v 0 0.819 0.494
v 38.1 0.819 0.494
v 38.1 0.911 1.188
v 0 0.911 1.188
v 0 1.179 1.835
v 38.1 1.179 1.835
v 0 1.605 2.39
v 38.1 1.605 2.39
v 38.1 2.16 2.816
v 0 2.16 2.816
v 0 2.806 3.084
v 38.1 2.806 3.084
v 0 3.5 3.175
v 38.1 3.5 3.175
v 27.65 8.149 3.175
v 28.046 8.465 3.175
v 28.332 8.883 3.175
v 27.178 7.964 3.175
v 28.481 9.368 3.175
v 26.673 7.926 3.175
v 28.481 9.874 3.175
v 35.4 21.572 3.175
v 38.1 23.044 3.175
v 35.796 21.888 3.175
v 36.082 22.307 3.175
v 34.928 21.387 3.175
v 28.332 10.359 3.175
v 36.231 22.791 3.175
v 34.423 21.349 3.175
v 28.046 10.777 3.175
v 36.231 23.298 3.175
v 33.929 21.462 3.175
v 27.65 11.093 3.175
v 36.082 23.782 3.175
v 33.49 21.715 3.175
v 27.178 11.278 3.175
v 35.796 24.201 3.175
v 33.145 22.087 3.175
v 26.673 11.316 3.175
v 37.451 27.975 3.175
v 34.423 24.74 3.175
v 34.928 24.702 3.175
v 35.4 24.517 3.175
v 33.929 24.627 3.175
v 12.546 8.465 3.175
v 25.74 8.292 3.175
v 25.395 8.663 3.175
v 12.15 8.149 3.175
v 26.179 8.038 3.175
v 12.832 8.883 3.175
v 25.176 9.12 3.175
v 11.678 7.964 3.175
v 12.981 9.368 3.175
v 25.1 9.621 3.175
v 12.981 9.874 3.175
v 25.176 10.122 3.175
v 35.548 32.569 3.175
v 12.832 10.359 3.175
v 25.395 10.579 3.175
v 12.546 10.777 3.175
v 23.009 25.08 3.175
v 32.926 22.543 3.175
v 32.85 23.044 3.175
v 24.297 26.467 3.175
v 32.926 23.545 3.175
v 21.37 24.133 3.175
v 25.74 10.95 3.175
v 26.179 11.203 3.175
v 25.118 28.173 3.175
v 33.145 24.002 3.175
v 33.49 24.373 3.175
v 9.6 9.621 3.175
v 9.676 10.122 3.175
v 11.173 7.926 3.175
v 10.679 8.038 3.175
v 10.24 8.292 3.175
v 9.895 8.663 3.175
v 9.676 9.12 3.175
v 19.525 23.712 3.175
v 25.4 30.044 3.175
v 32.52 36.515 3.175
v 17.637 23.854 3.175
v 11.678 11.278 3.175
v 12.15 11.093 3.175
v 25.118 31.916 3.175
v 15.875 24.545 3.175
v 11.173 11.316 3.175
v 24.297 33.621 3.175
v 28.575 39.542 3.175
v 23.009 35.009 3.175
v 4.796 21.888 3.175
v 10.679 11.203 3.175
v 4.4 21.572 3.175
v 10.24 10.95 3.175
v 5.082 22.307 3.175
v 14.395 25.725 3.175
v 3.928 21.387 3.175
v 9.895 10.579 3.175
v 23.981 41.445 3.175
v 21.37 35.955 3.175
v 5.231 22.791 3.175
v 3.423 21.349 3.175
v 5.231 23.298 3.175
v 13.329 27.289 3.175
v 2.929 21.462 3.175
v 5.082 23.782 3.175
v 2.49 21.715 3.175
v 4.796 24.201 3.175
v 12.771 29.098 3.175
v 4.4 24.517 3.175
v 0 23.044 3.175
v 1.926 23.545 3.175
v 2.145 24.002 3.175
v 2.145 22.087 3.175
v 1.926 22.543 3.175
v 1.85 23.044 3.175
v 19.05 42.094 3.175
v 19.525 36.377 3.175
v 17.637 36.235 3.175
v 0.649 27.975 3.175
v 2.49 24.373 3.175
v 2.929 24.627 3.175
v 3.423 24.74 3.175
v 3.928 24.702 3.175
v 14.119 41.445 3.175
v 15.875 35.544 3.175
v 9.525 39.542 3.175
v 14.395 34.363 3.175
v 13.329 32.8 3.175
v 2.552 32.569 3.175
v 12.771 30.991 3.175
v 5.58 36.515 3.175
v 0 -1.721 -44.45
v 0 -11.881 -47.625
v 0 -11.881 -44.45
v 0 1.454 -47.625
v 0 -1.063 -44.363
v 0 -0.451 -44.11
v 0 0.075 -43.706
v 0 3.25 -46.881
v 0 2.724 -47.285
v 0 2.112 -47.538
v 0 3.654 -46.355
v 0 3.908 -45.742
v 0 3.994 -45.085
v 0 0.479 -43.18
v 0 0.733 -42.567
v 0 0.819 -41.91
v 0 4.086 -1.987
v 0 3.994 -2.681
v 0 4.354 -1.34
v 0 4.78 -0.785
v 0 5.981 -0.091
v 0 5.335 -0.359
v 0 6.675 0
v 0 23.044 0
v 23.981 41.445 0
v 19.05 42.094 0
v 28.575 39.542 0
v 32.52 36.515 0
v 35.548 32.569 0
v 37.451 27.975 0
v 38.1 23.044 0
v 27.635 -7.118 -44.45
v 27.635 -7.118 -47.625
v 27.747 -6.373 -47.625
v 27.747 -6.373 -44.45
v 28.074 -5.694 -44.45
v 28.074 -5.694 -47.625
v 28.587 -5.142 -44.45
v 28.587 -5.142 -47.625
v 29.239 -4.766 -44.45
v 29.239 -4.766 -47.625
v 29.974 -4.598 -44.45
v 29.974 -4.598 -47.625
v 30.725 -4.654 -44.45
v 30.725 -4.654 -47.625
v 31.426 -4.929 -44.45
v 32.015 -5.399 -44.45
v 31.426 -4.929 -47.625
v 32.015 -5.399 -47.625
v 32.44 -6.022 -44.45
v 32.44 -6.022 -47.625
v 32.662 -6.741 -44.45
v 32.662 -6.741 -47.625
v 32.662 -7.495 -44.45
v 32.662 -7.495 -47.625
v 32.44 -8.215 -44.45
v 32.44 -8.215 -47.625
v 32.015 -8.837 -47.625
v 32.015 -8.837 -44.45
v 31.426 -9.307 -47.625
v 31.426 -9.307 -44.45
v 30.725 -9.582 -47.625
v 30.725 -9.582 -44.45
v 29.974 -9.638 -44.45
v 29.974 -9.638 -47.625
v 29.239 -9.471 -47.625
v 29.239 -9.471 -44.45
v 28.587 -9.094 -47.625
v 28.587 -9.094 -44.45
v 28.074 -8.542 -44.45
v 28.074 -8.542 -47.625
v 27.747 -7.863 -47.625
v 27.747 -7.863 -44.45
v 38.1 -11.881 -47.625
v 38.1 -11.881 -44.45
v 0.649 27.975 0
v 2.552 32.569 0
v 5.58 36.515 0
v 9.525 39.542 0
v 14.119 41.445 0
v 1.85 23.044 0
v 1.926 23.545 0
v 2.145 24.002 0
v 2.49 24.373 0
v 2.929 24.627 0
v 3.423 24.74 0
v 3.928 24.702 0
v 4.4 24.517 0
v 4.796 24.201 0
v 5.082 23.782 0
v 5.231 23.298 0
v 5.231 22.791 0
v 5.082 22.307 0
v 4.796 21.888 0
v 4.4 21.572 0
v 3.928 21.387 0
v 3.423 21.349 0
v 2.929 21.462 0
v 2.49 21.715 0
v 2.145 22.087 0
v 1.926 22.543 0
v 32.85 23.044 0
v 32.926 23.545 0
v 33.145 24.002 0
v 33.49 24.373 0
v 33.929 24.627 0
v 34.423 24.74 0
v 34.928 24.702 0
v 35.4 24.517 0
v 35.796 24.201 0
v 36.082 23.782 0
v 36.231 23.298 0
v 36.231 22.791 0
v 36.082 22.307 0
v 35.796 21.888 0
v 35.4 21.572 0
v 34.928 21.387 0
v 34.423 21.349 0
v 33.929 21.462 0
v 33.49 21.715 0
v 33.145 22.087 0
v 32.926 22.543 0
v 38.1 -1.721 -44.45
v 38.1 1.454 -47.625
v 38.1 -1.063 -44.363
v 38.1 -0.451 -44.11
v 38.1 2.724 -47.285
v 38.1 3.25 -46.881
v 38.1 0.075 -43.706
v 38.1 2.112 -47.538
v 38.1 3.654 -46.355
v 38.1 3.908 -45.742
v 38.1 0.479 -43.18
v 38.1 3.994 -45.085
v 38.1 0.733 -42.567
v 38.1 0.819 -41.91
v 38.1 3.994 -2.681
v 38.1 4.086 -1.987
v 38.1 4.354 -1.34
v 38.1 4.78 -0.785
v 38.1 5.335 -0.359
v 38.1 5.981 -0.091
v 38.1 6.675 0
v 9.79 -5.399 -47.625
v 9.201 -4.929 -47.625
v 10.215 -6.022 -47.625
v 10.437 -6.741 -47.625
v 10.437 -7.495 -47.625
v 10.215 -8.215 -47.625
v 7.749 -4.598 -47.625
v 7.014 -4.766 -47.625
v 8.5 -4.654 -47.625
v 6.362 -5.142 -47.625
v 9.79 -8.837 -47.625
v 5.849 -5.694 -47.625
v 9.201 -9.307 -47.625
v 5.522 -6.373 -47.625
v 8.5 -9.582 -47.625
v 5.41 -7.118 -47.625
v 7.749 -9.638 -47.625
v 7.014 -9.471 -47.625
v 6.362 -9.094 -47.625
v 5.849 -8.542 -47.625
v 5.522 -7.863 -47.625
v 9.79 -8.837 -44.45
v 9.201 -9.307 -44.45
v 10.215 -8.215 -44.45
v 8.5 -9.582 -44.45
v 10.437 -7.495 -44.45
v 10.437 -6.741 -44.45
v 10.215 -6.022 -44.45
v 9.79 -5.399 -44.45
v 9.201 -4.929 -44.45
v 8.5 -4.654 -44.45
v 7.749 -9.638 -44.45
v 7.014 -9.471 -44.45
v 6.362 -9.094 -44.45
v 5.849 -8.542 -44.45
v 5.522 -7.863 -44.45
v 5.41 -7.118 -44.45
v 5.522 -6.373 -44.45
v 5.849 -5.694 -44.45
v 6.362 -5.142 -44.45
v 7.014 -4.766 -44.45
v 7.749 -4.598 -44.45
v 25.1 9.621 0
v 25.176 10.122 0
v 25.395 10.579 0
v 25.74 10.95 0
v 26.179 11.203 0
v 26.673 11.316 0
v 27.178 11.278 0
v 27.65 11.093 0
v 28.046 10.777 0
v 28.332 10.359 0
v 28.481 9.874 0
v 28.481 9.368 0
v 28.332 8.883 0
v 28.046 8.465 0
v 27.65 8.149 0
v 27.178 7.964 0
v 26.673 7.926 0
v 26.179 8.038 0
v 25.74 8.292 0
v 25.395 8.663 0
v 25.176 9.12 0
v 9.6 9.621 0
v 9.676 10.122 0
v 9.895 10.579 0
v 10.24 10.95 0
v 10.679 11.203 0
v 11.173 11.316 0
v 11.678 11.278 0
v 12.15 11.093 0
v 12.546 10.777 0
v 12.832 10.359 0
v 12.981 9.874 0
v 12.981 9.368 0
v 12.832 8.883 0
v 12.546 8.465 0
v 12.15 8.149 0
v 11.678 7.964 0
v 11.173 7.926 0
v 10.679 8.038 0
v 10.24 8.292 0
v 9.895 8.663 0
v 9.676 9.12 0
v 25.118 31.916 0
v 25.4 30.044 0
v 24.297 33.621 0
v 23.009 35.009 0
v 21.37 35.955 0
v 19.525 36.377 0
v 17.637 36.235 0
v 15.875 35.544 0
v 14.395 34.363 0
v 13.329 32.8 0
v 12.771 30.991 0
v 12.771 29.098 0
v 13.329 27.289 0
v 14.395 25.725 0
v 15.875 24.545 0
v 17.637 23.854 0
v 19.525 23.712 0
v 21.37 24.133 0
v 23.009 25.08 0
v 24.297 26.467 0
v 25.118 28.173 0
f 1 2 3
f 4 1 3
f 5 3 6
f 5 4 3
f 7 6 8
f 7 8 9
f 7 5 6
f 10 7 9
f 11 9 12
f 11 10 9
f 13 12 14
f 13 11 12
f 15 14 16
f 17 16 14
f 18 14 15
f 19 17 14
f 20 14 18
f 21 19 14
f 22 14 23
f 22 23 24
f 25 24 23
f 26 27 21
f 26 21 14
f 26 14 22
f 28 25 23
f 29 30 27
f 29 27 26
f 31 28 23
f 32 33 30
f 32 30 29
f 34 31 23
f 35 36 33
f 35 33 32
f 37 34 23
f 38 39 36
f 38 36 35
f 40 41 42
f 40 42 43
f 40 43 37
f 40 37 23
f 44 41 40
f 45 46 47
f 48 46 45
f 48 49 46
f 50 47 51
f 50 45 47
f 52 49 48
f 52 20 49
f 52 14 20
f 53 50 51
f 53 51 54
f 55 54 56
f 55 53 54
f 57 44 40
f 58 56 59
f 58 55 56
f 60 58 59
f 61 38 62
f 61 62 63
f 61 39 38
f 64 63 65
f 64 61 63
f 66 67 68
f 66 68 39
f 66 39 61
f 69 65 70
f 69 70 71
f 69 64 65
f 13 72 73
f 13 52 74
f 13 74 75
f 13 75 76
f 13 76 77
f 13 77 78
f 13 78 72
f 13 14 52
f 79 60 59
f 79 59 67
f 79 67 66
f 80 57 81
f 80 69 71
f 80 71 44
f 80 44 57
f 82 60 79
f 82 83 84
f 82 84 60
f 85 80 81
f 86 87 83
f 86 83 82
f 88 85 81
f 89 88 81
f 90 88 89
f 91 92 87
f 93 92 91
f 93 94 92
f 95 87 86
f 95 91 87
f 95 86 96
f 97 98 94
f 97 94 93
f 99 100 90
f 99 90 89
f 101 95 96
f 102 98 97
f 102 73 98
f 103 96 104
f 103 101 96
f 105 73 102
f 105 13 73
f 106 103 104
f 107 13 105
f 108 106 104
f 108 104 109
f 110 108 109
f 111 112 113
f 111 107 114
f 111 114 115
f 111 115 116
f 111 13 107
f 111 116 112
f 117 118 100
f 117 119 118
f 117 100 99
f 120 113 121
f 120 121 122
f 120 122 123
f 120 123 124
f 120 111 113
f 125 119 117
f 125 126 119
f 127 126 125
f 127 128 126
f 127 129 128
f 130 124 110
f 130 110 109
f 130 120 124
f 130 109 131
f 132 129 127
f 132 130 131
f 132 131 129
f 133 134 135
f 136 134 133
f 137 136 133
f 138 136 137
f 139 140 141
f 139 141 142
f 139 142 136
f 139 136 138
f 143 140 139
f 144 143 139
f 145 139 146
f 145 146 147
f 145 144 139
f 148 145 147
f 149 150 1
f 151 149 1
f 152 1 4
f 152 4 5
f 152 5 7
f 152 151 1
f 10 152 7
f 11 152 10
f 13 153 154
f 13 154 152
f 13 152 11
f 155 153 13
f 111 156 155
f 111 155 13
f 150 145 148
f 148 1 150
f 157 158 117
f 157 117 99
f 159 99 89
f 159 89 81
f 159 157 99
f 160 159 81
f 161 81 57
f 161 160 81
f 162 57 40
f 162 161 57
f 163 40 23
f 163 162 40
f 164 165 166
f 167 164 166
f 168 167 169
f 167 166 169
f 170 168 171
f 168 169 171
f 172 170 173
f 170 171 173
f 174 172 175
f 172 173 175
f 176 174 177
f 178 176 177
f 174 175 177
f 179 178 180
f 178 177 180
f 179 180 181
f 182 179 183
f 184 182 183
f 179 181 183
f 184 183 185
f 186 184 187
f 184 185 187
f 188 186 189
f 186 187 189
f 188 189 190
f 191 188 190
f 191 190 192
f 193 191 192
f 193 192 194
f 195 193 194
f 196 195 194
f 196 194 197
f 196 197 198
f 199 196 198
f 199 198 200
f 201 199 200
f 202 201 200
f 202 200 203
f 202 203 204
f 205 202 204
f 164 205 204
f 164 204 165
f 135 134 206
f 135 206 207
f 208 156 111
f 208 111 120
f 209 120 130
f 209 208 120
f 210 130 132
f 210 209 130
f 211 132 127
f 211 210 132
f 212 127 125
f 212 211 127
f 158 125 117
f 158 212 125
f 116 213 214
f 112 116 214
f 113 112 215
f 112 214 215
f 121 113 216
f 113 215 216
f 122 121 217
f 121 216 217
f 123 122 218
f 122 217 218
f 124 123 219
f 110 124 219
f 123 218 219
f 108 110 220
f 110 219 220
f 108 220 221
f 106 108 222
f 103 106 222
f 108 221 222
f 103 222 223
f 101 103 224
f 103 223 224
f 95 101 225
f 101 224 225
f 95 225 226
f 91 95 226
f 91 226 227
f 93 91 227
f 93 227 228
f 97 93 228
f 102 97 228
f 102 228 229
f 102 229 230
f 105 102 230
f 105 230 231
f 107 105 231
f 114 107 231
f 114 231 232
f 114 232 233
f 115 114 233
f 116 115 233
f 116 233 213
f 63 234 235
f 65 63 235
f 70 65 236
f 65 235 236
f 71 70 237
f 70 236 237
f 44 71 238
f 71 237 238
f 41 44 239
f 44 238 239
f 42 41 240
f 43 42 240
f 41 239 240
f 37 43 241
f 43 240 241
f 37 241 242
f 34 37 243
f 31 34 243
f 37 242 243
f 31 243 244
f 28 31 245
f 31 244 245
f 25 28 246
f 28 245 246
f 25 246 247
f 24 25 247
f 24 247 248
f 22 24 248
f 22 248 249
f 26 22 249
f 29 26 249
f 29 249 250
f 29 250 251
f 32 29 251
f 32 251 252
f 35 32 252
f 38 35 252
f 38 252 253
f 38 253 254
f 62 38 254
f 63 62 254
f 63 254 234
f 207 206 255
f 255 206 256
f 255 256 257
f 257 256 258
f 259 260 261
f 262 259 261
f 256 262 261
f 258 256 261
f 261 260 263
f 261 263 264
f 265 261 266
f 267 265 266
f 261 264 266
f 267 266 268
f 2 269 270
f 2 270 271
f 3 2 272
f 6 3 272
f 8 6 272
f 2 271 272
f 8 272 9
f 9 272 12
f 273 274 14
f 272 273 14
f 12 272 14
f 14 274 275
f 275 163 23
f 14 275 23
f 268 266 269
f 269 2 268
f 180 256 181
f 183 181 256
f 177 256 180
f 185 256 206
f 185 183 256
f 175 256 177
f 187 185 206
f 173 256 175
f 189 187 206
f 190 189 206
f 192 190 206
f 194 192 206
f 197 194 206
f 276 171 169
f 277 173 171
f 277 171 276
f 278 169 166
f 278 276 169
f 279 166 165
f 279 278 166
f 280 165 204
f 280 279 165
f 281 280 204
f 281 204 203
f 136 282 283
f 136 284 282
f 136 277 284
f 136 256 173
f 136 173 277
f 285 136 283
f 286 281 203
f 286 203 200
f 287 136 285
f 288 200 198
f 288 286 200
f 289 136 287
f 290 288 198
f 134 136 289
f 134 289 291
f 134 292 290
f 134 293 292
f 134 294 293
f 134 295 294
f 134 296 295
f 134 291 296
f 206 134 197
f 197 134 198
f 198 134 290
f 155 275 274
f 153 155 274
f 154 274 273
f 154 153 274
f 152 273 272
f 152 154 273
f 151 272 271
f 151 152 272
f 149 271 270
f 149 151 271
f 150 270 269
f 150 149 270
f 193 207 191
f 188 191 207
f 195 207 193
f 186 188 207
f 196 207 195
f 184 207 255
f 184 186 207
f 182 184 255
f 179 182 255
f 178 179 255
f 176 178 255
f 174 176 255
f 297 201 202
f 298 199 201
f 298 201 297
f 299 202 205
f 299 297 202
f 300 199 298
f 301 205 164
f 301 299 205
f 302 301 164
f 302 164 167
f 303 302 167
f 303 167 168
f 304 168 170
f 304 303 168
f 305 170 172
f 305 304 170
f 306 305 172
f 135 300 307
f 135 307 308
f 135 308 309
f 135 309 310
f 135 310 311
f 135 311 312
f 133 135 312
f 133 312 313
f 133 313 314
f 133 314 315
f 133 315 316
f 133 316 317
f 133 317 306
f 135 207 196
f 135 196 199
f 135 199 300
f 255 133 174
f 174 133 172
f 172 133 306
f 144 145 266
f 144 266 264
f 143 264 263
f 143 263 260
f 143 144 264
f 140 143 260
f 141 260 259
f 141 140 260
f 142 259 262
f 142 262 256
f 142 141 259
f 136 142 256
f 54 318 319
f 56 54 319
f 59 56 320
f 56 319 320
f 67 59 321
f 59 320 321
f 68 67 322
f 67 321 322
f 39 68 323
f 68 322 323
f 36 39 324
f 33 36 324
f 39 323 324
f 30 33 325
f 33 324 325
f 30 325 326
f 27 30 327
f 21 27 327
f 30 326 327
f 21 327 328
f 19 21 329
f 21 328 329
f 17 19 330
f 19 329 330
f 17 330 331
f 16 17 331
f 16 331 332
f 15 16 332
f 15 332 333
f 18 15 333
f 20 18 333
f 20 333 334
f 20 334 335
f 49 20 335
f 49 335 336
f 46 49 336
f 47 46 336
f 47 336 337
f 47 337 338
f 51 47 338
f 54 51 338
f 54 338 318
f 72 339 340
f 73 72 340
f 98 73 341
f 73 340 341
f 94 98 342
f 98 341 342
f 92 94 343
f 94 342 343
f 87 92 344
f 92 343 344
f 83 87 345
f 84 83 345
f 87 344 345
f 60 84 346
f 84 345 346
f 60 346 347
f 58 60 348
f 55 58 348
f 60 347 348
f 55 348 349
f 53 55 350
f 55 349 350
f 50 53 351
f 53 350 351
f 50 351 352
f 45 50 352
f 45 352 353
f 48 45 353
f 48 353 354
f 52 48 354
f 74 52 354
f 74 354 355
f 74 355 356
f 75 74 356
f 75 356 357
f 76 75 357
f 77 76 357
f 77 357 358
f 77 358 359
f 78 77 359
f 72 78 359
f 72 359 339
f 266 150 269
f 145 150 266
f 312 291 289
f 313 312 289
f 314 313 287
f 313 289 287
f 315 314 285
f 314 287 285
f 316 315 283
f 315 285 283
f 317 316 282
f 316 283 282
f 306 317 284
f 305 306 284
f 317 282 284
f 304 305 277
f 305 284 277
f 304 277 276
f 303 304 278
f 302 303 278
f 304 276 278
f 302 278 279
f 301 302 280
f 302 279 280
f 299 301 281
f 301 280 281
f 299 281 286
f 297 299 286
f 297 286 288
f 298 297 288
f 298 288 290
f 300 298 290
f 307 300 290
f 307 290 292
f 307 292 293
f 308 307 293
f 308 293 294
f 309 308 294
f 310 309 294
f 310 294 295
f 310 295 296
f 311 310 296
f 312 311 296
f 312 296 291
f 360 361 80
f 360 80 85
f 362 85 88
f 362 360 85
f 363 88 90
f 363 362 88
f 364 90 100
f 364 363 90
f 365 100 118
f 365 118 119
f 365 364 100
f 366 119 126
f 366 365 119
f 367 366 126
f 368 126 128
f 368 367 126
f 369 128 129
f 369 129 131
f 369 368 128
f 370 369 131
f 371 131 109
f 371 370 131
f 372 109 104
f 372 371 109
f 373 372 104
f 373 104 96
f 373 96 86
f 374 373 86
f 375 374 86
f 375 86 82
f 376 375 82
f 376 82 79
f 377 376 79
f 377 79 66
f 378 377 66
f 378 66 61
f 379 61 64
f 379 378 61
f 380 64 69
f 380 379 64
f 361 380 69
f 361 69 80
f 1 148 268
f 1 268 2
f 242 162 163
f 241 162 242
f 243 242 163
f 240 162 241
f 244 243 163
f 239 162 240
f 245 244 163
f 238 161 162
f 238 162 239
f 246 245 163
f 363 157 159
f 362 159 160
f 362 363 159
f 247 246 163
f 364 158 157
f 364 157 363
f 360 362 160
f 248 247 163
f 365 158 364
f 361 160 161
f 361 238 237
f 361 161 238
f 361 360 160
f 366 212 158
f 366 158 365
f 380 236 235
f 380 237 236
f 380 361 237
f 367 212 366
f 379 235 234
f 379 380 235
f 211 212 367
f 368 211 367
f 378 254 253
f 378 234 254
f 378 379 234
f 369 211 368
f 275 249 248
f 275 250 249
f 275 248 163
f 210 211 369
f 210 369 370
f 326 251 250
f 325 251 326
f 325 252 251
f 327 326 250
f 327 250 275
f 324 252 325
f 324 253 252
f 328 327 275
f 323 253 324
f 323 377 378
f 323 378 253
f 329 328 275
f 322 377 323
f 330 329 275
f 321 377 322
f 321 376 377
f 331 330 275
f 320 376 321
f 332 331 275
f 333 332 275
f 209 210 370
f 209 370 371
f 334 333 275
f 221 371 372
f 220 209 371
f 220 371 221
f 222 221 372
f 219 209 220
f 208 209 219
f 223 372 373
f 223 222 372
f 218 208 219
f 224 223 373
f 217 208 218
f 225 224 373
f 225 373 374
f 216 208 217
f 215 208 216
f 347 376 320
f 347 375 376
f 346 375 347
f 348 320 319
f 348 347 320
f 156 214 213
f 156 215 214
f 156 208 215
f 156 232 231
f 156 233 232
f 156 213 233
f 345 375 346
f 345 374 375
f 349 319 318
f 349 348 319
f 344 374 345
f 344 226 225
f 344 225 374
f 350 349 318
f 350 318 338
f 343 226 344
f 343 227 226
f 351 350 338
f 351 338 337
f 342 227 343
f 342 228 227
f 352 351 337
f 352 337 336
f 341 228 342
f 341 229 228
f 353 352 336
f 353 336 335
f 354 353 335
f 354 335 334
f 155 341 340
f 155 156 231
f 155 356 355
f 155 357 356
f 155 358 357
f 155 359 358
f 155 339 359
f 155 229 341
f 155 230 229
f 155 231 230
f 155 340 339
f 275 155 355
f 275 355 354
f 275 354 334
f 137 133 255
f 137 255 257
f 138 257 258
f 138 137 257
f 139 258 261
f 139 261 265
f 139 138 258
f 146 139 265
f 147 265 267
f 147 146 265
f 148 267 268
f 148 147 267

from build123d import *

# Parameters (mm, degrees)
BOSS_EXTRUDE1_DEPTH        = 38.1
F_8_0_199_DIAMETER_HOLE1_D = 5.0546
SKETCH11_R                 = 6.350000009
CUT_EXTRUDE1_DEPTH         = 77.185209693
M3_CLEARANCE_HOLE1_D       = 3.4


with BuildPart() as part:
    # Sketch1 → Boss-Extrude1 (new body)
    with BuildSketch(Plane(origin=(0, 0, 0), x_dir=(0, 0, -1), z_dir=(1, 0, 0))):
        with BuildLine():
            Line((0, 42.094372261), (0, 6.675328802))
            ThreePointArc((0, 6.675328802), (0.785233991, 4.779606252), (2.680956542, 3.994372261))
            Line((2.680956542, 3.994372261), (45.085, 3.994372261))
            ThreePointArc((45.085, 3.994372261), (46.881051224, 3.250423485), (47.625, 1.454372261))
            Line((47.625, 1.454372261), (47.625, -11.880627739))
            Line((47.625, -11.880627739), (44.45, -11.880627739))
            Line((44.45, -11.880627739), (44.45, -1.720627739))
            ThreePointArc((44.45, -1.720627739), (43.706051224, 0.075423485), (41.91, 0.819372261))
            Line((41.91, 0.819372261), (-0.494043458, 0.819372261))
            ThreePointArc((-0.494043458, 0.819372261), (-2.389766009, 1.604606252), (-3.175, 3.500328802))
            Line((-3.175, 3.500328802), (-3.175, 42.094372261))
            Line((-3.175, 42.094372261), (0, 42.094372261))
        make_face()
    extrude(amount=BOSS_EXTRUDE1_DEPTH)

    # #8 (0.199) Diameter Hole1 (through all)
    with Locations(Plane.XY.offset(-44.45)):
        with Locations((7.9375, -7.118127739), (30.1625, -7.118127739)):
            Hole(F_8_0_199_DIAMETER_HOLE1_D / 2)

    # Sketch11 → Cut-Extrude1 (cut, through all)
    with BuildSketch(Plane.XY.offset(3.175)):
        with BuildLine():
            Line((38.1, 42.094372261), (19.05, 42.094372261))
            ThreePointArc((19.05, 42.094372261), (32.520384182, 36.514756442), (38.1, 23.044372261))
            Line((38.1, 23.044372261), (38.1, 42.094372261))
        make_face()
        with BuildLine():
            Line((0, 42.094372261), (0, 23.044372261))
            ThreePointArc((0, 23.044372261), (5.579615818, 36.514756442), (19.05, 42.094372261))
            Line((19.05, 42.094372261), (0, 42.094372261))
        make_face()
        with Locations((19.05, 30.044372231)):
            Circle(SKETCH11_R)
    extrude(amount=-CUT_EXTRUDE1_DEPTH, mode=Mode.SUBTRACT)

    # M3 Clearance Hole1 (through all)
    with Locations(Plane.XY.offset(3.175)):
        with Locations((3.55, 23.044372261), (34.55, 23.044372261), (26.8, 9.620978502), (11.3, 9.620978502)):
            Hole(M3_CLEARANCE_HOLE1_D / 2)


solid = part.part
